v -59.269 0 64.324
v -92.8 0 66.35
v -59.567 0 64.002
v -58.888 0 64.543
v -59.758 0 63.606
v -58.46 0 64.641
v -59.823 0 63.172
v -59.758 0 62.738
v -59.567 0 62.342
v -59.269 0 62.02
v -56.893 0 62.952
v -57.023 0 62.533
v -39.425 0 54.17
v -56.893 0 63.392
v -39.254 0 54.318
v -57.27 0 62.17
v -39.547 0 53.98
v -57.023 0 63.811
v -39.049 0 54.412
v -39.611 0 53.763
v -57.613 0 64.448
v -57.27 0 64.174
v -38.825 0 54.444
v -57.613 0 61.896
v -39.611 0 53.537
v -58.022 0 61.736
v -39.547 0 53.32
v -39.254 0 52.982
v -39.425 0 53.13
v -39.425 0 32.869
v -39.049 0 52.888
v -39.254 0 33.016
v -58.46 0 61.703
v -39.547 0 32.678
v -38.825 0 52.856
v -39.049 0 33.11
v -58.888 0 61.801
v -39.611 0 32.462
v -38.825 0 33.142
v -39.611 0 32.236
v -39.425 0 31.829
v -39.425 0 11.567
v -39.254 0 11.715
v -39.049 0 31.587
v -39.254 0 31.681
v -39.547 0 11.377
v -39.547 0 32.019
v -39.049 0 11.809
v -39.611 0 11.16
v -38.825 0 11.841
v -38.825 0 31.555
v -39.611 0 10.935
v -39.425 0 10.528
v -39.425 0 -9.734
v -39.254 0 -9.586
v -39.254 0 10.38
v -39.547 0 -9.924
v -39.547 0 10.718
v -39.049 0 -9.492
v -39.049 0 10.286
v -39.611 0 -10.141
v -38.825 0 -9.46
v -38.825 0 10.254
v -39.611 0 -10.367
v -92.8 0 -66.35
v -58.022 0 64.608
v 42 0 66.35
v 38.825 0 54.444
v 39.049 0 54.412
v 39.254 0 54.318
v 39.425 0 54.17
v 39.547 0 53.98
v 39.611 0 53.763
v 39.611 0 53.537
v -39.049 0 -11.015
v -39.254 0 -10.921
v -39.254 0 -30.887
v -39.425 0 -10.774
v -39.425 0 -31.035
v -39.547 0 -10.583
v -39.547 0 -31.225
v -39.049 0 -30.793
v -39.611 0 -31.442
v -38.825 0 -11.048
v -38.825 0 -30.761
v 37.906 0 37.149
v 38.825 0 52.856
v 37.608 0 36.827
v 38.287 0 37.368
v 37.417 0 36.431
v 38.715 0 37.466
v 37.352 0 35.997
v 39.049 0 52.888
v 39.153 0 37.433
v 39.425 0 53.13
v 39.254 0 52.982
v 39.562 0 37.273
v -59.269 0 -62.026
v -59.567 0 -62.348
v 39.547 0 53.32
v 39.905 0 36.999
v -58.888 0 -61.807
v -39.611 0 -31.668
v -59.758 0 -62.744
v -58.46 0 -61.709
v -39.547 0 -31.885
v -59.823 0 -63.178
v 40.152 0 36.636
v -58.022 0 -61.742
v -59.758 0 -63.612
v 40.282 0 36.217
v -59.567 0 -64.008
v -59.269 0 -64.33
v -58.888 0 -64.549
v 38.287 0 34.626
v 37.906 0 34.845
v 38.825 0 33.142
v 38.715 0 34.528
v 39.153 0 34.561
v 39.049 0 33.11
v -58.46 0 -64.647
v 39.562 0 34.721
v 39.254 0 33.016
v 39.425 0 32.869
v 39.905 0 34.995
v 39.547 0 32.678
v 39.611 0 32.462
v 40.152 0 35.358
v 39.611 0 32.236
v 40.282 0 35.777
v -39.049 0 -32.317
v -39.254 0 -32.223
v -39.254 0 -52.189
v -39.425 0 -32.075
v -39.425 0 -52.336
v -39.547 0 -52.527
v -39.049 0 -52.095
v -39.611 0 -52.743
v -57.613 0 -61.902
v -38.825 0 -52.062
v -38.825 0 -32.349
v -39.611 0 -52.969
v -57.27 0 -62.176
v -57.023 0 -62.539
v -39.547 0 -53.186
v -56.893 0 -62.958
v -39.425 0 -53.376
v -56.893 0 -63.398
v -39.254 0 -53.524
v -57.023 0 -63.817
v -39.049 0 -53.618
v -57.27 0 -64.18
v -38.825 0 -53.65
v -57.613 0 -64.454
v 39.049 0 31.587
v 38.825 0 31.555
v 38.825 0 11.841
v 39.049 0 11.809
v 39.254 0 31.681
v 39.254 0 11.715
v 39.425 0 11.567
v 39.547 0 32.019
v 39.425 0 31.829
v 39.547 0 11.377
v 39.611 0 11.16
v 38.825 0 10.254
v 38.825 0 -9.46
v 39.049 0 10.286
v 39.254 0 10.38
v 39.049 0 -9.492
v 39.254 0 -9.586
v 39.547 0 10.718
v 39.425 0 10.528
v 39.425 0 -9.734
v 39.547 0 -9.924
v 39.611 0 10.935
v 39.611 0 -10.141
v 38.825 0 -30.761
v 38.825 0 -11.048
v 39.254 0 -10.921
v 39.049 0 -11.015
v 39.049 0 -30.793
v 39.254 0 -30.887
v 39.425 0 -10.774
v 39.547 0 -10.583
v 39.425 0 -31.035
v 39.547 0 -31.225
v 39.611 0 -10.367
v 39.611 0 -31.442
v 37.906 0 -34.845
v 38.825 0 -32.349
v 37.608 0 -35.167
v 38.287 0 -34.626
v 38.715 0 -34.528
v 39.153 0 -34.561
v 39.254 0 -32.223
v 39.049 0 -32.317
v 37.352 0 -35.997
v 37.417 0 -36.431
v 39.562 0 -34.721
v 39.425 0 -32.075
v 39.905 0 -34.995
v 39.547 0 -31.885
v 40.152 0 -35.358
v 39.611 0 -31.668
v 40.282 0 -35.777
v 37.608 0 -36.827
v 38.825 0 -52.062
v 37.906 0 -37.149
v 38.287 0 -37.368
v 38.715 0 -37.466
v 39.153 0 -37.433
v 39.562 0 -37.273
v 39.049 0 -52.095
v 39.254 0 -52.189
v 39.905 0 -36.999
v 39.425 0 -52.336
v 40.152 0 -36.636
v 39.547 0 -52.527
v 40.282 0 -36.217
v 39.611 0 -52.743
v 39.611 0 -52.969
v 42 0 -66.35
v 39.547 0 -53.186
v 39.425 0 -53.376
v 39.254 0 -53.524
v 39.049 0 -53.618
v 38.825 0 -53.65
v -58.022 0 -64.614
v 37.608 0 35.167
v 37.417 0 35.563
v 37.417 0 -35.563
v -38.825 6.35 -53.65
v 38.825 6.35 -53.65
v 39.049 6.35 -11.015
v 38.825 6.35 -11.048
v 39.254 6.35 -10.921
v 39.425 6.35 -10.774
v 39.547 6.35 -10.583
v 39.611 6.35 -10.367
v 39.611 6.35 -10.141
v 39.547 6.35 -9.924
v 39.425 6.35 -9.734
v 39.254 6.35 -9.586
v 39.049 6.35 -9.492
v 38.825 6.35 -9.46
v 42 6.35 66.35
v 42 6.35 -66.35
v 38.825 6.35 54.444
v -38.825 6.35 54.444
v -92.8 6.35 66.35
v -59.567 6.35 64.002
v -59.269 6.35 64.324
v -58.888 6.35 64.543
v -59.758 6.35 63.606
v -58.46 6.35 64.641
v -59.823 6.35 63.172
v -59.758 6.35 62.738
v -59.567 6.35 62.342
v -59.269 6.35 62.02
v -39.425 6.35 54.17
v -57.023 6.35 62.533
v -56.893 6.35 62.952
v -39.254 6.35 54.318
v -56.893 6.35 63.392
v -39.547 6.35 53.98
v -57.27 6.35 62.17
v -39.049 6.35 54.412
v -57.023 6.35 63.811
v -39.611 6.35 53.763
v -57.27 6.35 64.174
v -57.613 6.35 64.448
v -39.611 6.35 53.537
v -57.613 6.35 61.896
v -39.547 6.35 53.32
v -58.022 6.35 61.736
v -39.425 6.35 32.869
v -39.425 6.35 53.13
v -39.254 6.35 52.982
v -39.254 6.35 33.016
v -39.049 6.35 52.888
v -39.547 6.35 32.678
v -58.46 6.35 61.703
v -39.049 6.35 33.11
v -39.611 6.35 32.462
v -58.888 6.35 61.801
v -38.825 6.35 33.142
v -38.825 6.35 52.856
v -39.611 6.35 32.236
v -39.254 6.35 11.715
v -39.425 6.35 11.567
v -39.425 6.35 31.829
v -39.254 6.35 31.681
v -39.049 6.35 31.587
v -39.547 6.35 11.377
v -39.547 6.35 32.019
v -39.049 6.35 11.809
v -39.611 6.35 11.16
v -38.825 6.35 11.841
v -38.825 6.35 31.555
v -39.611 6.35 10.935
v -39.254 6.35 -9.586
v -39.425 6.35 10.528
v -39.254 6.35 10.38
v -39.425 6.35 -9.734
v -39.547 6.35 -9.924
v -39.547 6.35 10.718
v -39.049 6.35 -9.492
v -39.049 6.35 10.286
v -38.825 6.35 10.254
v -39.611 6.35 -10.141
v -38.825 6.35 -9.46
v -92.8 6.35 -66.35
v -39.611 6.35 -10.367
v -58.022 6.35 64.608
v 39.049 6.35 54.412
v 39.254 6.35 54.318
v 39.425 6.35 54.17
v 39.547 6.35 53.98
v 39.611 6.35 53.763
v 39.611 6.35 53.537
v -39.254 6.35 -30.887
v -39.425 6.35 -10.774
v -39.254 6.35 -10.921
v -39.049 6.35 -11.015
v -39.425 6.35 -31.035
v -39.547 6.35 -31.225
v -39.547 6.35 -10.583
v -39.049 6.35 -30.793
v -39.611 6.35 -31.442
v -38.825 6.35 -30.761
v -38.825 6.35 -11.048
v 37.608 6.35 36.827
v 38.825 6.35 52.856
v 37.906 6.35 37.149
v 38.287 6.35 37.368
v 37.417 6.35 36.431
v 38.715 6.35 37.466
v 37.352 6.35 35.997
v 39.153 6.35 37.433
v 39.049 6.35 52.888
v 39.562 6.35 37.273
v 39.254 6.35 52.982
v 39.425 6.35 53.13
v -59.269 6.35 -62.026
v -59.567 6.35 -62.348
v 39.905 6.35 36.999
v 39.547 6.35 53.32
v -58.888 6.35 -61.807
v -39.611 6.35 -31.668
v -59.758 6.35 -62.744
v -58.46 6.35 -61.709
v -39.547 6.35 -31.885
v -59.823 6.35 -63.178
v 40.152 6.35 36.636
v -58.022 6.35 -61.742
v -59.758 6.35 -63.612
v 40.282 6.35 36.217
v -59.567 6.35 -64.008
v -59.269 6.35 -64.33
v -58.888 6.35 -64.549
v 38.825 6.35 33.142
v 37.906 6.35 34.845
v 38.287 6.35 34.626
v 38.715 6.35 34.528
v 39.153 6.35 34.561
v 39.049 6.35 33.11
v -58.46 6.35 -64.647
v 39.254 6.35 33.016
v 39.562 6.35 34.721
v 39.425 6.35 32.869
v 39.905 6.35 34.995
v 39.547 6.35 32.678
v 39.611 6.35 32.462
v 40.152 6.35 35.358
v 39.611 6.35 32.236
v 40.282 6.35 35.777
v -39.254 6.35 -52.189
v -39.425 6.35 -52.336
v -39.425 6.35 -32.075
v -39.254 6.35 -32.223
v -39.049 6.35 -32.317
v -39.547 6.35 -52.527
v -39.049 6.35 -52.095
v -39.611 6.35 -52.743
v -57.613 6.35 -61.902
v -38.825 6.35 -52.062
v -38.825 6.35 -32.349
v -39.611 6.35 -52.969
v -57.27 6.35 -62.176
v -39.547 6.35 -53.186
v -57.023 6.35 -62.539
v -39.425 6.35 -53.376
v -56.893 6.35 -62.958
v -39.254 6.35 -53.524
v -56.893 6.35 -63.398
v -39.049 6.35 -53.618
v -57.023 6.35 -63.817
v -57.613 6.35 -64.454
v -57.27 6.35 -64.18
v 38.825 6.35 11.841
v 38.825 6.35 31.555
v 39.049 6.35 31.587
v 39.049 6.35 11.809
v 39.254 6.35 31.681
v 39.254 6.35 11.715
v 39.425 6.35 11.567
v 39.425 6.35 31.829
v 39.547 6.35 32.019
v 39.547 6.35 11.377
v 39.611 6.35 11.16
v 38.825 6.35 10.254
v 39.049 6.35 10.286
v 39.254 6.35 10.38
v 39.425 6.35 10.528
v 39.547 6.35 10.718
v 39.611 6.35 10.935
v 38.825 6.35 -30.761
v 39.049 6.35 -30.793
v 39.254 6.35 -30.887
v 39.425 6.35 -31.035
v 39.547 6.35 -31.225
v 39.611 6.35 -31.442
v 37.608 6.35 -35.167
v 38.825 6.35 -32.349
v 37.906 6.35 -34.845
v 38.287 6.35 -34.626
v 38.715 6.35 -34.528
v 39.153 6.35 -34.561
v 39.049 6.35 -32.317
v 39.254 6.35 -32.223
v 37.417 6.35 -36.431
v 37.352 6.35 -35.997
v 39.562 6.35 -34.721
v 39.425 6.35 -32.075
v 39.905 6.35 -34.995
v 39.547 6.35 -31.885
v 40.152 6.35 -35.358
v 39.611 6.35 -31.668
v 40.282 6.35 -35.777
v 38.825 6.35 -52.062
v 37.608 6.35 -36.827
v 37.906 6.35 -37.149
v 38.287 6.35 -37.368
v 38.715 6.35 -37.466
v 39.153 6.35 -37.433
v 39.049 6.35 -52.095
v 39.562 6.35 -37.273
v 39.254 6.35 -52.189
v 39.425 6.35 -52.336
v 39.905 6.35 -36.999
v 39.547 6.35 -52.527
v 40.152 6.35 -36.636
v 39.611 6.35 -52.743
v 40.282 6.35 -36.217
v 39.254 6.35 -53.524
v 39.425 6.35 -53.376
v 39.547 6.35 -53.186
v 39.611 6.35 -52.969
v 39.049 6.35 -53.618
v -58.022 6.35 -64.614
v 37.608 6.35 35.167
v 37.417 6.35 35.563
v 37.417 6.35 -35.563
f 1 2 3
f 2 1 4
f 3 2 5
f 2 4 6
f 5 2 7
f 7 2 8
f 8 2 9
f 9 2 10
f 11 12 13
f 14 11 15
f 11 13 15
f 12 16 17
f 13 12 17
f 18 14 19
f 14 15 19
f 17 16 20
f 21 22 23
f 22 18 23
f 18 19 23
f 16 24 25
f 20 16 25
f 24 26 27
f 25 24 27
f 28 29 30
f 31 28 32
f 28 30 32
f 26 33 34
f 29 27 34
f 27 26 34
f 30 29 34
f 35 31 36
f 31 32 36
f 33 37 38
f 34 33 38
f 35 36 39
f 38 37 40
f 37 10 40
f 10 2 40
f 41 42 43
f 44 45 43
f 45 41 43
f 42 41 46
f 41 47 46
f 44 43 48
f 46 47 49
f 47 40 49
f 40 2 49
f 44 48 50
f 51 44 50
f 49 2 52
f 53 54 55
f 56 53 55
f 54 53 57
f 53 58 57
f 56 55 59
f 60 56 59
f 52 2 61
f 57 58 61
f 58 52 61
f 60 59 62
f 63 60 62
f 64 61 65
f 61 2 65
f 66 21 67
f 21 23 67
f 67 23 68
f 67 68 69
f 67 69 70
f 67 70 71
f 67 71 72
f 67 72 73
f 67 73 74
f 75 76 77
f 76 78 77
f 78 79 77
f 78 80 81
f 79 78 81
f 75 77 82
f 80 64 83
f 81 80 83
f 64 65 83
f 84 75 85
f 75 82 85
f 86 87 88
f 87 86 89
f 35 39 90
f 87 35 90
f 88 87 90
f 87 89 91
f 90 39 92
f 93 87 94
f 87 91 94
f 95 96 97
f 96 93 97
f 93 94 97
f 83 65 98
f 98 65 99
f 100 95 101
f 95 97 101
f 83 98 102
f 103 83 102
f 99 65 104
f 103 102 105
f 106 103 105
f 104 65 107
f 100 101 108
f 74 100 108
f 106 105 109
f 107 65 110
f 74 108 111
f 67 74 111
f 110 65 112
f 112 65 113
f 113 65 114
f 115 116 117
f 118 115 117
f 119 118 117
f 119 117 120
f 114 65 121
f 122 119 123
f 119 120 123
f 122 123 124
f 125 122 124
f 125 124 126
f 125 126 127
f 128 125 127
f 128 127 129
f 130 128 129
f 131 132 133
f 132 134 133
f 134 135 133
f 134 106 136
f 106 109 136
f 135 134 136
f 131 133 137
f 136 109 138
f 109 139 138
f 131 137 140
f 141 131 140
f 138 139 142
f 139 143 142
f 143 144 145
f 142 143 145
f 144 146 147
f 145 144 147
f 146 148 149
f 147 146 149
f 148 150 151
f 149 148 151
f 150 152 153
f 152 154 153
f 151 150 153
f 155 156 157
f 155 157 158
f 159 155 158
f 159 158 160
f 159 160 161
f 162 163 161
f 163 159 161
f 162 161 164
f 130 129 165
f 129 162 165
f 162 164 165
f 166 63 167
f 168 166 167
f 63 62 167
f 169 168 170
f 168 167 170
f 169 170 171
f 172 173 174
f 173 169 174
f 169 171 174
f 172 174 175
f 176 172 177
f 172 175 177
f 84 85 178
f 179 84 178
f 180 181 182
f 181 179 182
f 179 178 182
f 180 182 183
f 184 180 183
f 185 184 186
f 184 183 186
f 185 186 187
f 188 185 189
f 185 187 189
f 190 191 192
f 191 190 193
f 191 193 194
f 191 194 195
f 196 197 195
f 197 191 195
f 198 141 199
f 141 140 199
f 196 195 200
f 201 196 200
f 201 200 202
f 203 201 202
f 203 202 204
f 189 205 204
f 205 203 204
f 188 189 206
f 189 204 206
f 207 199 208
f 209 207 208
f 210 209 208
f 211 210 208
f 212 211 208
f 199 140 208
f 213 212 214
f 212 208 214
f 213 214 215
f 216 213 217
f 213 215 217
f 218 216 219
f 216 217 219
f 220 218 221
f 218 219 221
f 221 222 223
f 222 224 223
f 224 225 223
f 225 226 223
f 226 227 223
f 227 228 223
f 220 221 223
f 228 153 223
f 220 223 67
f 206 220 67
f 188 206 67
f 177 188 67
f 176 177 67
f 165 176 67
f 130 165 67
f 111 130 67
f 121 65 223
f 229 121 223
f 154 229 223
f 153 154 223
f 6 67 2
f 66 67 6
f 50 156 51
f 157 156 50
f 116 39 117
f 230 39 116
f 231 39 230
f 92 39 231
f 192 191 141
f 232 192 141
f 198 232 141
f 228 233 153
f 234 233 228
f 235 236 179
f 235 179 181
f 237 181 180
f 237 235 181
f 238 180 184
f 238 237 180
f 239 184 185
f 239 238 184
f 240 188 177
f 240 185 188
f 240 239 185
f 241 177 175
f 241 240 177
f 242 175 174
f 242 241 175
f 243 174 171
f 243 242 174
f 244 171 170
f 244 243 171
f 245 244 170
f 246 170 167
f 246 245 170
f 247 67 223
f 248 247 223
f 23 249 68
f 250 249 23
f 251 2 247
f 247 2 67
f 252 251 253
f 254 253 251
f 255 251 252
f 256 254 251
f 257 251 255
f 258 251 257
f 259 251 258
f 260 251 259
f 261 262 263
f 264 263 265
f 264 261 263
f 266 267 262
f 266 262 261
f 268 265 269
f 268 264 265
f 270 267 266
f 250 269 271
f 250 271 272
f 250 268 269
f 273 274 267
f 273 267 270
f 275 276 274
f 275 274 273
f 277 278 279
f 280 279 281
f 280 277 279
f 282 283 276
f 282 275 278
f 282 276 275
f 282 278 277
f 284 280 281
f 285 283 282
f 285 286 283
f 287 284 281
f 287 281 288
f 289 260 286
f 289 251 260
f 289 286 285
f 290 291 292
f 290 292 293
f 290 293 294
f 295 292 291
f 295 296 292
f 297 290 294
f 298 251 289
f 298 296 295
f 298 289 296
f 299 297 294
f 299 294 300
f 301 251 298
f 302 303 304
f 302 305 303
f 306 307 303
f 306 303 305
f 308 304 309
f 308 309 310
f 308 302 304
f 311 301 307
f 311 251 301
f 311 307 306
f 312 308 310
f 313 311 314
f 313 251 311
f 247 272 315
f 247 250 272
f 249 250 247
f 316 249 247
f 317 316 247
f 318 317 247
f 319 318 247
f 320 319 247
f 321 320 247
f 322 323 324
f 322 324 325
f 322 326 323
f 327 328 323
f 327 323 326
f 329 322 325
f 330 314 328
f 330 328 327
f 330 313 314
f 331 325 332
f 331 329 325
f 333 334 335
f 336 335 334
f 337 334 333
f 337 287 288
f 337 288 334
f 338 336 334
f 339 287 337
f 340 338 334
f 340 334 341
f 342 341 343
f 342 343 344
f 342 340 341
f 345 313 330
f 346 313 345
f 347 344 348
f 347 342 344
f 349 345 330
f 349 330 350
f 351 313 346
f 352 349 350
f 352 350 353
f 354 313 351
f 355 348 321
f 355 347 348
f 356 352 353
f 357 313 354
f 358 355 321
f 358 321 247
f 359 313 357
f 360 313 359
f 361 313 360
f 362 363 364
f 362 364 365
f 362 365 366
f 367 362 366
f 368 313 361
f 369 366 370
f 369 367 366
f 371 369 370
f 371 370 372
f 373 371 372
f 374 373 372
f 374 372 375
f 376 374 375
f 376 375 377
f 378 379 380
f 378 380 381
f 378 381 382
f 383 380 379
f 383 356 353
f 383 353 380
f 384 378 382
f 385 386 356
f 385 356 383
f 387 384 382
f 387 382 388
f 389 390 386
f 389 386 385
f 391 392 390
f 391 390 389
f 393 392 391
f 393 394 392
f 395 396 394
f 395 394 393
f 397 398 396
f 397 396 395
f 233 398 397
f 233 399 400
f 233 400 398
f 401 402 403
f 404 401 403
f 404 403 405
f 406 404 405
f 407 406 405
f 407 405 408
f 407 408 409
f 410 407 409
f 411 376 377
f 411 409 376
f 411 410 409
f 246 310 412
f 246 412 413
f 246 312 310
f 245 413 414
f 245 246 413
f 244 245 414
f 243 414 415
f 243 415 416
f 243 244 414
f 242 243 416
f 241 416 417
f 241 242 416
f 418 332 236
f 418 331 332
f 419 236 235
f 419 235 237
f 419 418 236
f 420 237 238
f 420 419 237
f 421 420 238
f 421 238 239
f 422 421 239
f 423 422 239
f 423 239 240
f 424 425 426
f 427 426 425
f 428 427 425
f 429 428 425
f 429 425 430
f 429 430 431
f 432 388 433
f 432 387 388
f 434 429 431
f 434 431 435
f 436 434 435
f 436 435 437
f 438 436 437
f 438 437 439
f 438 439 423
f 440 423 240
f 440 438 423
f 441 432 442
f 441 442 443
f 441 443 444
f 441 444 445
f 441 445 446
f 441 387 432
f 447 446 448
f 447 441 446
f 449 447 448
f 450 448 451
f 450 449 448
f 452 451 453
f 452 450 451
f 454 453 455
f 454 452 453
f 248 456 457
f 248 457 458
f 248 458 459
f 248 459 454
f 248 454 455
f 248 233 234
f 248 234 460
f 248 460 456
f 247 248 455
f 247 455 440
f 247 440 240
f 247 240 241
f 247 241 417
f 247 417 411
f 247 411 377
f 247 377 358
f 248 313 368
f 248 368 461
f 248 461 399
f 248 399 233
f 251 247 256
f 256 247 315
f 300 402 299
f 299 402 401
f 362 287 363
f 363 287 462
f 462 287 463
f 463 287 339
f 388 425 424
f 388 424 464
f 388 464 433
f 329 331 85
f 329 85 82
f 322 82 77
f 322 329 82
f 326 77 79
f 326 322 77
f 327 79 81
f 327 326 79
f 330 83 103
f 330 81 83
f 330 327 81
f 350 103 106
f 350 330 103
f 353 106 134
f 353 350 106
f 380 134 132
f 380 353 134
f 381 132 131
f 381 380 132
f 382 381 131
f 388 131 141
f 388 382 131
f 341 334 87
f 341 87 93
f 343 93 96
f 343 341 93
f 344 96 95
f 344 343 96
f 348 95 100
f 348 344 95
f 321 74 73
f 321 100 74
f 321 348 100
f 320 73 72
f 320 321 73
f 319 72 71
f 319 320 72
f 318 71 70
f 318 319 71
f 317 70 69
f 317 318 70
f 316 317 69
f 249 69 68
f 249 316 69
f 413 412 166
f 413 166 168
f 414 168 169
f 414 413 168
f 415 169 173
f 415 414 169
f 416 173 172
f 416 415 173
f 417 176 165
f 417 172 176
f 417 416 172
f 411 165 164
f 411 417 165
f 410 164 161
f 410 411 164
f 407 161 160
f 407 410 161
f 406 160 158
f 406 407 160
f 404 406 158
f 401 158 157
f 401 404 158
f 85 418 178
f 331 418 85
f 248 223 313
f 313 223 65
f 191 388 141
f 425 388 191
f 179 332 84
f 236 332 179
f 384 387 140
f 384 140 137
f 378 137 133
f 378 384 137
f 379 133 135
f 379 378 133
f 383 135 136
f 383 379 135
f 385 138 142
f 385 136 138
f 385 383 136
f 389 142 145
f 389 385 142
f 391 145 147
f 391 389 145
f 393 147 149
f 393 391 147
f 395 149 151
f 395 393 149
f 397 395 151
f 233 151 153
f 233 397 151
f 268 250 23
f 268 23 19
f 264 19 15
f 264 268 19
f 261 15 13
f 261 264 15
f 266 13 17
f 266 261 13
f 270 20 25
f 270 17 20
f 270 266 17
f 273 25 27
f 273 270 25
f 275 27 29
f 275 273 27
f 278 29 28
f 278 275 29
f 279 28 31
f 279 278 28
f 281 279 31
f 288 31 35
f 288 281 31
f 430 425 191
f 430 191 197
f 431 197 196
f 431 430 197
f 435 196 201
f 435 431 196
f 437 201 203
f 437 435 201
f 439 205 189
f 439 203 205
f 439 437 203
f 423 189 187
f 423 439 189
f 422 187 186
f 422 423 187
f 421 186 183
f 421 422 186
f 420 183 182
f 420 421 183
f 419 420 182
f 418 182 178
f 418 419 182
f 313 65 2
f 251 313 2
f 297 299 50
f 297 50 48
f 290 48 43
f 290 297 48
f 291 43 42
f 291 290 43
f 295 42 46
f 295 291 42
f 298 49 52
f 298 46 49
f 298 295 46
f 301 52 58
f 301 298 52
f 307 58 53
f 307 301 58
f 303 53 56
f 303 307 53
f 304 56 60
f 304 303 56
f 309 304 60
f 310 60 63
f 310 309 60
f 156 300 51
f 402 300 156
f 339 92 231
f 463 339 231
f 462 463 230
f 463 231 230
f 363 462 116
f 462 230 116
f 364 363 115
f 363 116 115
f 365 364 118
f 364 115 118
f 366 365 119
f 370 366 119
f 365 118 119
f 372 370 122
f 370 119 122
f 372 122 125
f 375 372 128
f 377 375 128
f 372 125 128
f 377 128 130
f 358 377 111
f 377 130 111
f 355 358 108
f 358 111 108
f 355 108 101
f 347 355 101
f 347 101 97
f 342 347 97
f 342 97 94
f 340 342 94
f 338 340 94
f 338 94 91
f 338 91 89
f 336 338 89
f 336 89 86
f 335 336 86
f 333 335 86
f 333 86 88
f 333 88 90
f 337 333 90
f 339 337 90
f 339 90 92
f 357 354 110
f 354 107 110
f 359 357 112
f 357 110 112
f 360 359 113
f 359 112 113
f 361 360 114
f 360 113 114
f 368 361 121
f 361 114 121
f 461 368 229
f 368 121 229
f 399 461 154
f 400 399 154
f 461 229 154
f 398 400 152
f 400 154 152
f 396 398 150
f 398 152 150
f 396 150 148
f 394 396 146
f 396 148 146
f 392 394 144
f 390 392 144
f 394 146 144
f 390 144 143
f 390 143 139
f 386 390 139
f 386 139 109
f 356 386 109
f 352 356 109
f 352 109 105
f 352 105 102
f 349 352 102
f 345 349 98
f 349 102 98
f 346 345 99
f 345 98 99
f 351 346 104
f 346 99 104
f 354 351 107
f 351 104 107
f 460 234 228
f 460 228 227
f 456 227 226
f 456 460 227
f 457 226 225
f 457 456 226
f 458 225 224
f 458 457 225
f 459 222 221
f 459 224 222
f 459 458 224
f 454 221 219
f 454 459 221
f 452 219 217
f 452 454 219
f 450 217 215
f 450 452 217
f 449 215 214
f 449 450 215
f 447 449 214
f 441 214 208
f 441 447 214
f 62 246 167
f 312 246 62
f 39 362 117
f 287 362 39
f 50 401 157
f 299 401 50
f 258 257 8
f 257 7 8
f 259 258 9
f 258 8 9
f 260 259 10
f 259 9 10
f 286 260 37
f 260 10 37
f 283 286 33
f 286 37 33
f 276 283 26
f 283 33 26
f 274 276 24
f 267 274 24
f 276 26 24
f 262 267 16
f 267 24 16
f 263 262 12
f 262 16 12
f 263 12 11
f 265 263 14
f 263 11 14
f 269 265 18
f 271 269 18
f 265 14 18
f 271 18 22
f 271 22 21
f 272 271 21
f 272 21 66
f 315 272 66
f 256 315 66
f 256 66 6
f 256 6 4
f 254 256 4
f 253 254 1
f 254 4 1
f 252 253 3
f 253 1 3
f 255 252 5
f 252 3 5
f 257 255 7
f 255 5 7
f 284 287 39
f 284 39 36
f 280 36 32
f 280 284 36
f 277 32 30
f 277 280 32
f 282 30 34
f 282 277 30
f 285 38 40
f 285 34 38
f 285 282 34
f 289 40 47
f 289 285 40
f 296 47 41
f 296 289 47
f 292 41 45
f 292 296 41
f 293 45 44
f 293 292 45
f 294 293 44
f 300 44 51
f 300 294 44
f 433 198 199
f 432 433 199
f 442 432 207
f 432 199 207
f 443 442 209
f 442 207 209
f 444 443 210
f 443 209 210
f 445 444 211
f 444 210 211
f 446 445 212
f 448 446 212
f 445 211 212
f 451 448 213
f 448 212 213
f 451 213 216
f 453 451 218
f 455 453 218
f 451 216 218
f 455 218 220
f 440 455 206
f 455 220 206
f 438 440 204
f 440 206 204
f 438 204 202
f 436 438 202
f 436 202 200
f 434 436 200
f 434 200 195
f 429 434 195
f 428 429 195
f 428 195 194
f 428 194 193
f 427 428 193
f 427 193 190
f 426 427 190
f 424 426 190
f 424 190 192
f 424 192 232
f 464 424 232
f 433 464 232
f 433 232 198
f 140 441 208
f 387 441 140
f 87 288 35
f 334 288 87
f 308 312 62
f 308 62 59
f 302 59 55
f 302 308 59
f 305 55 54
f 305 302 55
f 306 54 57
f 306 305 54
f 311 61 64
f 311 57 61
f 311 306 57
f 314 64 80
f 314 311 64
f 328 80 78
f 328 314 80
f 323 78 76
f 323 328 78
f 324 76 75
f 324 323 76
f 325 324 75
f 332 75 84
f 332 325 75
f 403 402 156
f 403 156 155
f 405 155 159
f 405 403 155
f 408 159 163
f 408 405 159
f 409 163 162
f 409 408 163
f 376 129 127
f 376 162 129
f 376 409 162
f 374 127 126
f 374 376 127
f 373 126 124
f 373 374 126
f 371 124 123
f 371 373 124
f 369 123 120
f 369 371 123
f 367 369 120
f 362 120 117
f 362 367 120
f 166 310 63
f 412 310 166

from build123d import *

# Parameters (mm, degrees)
BOSS_EXTRUDE1_DEPTH       = 6.35
F_4_CLEARANCE_HOLE1_D     = 2.9464
CUT_EXTRUDE2_DEPTH        = 7.35
F_4_CLEARANCE_HOLE2_D     = 2.9464
F_4_CLEARANCE_HOLE2_DEPTH = 6.35
F_4_CLEARANCE_HOLE2_TIP   = 0.885187864


with BuildPart() as part:
    # Sketch1 → Boss-Extrude1 (new body)
    with BuildSketch(Plane(origin=(0, 0, 0), x_dir=(1, 0, 0), z_dir=(0, 1, 0))):
        Polygon((-42, -66.35), (42, -66.35), (42, 66.35), (-42, 66.35), (-92.8, 66.35), (-92.8, -66.35), align=None)
    extrude(amount=BOSS_EXTRUDE1_DEPTH)

    # #4 Clearance Hole1 (through all)
    with Locations(Plane(origin=(0, 6.35, 0), x_dir=(1, 0, 0), z_dir=(0, 1, 0))):
        with Locations((38.825, 35.997), (38.825, -35.997)):
            Hole(F_4_CLEARANCE_HOLE1_D / 2)

    # Sketch3 → Cut-Extrude2 (cut, through all)
    with BuildSketch(Plane(origin=(0, 6.35, 0), x_dir=(1, 0, 0), z_dir=(0, 1, 0))):
        with BuildLine():
            Line((-38.825, -52.85625), (38.825, -52.85625))
            ThreePointArc((38.825, -52.85625), (39.61875, -53.65), (38.825, -54.44375))
            Line((38.825, -54.44375), (-38.825, -54.44375))
            ThreePointArc((-38.825, -54.44375), (-39.61875, -53.65), (-38.825, -52.85625))
        make_face()
        with BuildLine():
            Line((-38.825, -31.555), (38.825, -31.555))
            ThreePointArc((38.825, -31.555), (39.61875, -32.34875), (38.825, -33.1425))
            Line((38.825, -33.1425), (-38.825, -33.1425))
            ThreePointArc((-38.825, -33.1425), (-39.61875, -32.34875), (-38.825, -31.555))
        make_face()
        with BuildLine():
            Line((-38.825, -10.25375), (38.825, -10.25375))
            ThreePointArc((38.825, -10.25375), (39.61875, -11.0475), (38.825, -11.84125))
            Line((38.825, -11.84125), (-38.825, -11.84125))
            ThreePointArc((-38.825, -11.84125), (-39.61875, -11.0475), (-38.825, -10.25375))
        make_face()
        with BuildLine():
            Line((-38.825, 11.0475), (38.825, 11.0475))
            ThreePointArc((38.825, 11.0475), (39.61875, 10.25375), (38.825, 9.46))
            Line((38.825, 9.46), (-38.825, 9.46))
            ThreePointArc((-38.825, 9.46), (-39.61875, 10.25375), (-38.825, 11.0475))
        make_face()
        with BuildLine():
            Line((-38.825, 32.34875), (38.825, 32.34875))
            ThreePointArc((38.825, 32.34875), (39.61875, 31.555), (38.825, 30.76125))
            Line((38.825, 30.76125), (-38.825, 30.76125))
            ThreePointArc((-38.825, 30.76125), (-39.61875, 31.555), (-38.825, 32.34875))
        make_face()
        with BuildLine():
            Line((-38.825, 53.65), (38.825, 53.65))
            ThreePointArc((38.825, 53.65), (39.61875, 52.85625), (38.825, 52.0625))
            Line((38.825, 52.0625), (-38.825, 52.0625))
            ThreePointArc((-38.825, 52.0625), (-39.61875, 52.85625), (-38.825, 53.65))
        make_face()
    extrude(amount=-CUT_EXTRUDE2_DEPTH, mode=Mode.SUBTRACT)

    # #4 Clearance Hole2
    with Locations(Plane(origin=(0, 6.35, 0), x_dir=(1, 0, 0), z_dir=(0, 1, 0))):
        with Locations((-58.35, 63.178000009), (-58.35, -63.171999991)):
            Hole(F_4_CLEARANCE_HOLE2_D / 2, depth=F_4_CLEARANCE_HOLE2_DEPTH)
            with Locations((0, 0, -(F_4_CLEARANCE_HOLE2_DEPTH + F_4_CLEARANCE_HOLE2_TIP / 2))):  # 118° drill point
                Cone(0, F_4_CLEARANCE_HOLE2_D / 2, F_4_CLEARANCE_HOLE2_TIP, mode=Mode.SUBTRACT)


solid = part.part
